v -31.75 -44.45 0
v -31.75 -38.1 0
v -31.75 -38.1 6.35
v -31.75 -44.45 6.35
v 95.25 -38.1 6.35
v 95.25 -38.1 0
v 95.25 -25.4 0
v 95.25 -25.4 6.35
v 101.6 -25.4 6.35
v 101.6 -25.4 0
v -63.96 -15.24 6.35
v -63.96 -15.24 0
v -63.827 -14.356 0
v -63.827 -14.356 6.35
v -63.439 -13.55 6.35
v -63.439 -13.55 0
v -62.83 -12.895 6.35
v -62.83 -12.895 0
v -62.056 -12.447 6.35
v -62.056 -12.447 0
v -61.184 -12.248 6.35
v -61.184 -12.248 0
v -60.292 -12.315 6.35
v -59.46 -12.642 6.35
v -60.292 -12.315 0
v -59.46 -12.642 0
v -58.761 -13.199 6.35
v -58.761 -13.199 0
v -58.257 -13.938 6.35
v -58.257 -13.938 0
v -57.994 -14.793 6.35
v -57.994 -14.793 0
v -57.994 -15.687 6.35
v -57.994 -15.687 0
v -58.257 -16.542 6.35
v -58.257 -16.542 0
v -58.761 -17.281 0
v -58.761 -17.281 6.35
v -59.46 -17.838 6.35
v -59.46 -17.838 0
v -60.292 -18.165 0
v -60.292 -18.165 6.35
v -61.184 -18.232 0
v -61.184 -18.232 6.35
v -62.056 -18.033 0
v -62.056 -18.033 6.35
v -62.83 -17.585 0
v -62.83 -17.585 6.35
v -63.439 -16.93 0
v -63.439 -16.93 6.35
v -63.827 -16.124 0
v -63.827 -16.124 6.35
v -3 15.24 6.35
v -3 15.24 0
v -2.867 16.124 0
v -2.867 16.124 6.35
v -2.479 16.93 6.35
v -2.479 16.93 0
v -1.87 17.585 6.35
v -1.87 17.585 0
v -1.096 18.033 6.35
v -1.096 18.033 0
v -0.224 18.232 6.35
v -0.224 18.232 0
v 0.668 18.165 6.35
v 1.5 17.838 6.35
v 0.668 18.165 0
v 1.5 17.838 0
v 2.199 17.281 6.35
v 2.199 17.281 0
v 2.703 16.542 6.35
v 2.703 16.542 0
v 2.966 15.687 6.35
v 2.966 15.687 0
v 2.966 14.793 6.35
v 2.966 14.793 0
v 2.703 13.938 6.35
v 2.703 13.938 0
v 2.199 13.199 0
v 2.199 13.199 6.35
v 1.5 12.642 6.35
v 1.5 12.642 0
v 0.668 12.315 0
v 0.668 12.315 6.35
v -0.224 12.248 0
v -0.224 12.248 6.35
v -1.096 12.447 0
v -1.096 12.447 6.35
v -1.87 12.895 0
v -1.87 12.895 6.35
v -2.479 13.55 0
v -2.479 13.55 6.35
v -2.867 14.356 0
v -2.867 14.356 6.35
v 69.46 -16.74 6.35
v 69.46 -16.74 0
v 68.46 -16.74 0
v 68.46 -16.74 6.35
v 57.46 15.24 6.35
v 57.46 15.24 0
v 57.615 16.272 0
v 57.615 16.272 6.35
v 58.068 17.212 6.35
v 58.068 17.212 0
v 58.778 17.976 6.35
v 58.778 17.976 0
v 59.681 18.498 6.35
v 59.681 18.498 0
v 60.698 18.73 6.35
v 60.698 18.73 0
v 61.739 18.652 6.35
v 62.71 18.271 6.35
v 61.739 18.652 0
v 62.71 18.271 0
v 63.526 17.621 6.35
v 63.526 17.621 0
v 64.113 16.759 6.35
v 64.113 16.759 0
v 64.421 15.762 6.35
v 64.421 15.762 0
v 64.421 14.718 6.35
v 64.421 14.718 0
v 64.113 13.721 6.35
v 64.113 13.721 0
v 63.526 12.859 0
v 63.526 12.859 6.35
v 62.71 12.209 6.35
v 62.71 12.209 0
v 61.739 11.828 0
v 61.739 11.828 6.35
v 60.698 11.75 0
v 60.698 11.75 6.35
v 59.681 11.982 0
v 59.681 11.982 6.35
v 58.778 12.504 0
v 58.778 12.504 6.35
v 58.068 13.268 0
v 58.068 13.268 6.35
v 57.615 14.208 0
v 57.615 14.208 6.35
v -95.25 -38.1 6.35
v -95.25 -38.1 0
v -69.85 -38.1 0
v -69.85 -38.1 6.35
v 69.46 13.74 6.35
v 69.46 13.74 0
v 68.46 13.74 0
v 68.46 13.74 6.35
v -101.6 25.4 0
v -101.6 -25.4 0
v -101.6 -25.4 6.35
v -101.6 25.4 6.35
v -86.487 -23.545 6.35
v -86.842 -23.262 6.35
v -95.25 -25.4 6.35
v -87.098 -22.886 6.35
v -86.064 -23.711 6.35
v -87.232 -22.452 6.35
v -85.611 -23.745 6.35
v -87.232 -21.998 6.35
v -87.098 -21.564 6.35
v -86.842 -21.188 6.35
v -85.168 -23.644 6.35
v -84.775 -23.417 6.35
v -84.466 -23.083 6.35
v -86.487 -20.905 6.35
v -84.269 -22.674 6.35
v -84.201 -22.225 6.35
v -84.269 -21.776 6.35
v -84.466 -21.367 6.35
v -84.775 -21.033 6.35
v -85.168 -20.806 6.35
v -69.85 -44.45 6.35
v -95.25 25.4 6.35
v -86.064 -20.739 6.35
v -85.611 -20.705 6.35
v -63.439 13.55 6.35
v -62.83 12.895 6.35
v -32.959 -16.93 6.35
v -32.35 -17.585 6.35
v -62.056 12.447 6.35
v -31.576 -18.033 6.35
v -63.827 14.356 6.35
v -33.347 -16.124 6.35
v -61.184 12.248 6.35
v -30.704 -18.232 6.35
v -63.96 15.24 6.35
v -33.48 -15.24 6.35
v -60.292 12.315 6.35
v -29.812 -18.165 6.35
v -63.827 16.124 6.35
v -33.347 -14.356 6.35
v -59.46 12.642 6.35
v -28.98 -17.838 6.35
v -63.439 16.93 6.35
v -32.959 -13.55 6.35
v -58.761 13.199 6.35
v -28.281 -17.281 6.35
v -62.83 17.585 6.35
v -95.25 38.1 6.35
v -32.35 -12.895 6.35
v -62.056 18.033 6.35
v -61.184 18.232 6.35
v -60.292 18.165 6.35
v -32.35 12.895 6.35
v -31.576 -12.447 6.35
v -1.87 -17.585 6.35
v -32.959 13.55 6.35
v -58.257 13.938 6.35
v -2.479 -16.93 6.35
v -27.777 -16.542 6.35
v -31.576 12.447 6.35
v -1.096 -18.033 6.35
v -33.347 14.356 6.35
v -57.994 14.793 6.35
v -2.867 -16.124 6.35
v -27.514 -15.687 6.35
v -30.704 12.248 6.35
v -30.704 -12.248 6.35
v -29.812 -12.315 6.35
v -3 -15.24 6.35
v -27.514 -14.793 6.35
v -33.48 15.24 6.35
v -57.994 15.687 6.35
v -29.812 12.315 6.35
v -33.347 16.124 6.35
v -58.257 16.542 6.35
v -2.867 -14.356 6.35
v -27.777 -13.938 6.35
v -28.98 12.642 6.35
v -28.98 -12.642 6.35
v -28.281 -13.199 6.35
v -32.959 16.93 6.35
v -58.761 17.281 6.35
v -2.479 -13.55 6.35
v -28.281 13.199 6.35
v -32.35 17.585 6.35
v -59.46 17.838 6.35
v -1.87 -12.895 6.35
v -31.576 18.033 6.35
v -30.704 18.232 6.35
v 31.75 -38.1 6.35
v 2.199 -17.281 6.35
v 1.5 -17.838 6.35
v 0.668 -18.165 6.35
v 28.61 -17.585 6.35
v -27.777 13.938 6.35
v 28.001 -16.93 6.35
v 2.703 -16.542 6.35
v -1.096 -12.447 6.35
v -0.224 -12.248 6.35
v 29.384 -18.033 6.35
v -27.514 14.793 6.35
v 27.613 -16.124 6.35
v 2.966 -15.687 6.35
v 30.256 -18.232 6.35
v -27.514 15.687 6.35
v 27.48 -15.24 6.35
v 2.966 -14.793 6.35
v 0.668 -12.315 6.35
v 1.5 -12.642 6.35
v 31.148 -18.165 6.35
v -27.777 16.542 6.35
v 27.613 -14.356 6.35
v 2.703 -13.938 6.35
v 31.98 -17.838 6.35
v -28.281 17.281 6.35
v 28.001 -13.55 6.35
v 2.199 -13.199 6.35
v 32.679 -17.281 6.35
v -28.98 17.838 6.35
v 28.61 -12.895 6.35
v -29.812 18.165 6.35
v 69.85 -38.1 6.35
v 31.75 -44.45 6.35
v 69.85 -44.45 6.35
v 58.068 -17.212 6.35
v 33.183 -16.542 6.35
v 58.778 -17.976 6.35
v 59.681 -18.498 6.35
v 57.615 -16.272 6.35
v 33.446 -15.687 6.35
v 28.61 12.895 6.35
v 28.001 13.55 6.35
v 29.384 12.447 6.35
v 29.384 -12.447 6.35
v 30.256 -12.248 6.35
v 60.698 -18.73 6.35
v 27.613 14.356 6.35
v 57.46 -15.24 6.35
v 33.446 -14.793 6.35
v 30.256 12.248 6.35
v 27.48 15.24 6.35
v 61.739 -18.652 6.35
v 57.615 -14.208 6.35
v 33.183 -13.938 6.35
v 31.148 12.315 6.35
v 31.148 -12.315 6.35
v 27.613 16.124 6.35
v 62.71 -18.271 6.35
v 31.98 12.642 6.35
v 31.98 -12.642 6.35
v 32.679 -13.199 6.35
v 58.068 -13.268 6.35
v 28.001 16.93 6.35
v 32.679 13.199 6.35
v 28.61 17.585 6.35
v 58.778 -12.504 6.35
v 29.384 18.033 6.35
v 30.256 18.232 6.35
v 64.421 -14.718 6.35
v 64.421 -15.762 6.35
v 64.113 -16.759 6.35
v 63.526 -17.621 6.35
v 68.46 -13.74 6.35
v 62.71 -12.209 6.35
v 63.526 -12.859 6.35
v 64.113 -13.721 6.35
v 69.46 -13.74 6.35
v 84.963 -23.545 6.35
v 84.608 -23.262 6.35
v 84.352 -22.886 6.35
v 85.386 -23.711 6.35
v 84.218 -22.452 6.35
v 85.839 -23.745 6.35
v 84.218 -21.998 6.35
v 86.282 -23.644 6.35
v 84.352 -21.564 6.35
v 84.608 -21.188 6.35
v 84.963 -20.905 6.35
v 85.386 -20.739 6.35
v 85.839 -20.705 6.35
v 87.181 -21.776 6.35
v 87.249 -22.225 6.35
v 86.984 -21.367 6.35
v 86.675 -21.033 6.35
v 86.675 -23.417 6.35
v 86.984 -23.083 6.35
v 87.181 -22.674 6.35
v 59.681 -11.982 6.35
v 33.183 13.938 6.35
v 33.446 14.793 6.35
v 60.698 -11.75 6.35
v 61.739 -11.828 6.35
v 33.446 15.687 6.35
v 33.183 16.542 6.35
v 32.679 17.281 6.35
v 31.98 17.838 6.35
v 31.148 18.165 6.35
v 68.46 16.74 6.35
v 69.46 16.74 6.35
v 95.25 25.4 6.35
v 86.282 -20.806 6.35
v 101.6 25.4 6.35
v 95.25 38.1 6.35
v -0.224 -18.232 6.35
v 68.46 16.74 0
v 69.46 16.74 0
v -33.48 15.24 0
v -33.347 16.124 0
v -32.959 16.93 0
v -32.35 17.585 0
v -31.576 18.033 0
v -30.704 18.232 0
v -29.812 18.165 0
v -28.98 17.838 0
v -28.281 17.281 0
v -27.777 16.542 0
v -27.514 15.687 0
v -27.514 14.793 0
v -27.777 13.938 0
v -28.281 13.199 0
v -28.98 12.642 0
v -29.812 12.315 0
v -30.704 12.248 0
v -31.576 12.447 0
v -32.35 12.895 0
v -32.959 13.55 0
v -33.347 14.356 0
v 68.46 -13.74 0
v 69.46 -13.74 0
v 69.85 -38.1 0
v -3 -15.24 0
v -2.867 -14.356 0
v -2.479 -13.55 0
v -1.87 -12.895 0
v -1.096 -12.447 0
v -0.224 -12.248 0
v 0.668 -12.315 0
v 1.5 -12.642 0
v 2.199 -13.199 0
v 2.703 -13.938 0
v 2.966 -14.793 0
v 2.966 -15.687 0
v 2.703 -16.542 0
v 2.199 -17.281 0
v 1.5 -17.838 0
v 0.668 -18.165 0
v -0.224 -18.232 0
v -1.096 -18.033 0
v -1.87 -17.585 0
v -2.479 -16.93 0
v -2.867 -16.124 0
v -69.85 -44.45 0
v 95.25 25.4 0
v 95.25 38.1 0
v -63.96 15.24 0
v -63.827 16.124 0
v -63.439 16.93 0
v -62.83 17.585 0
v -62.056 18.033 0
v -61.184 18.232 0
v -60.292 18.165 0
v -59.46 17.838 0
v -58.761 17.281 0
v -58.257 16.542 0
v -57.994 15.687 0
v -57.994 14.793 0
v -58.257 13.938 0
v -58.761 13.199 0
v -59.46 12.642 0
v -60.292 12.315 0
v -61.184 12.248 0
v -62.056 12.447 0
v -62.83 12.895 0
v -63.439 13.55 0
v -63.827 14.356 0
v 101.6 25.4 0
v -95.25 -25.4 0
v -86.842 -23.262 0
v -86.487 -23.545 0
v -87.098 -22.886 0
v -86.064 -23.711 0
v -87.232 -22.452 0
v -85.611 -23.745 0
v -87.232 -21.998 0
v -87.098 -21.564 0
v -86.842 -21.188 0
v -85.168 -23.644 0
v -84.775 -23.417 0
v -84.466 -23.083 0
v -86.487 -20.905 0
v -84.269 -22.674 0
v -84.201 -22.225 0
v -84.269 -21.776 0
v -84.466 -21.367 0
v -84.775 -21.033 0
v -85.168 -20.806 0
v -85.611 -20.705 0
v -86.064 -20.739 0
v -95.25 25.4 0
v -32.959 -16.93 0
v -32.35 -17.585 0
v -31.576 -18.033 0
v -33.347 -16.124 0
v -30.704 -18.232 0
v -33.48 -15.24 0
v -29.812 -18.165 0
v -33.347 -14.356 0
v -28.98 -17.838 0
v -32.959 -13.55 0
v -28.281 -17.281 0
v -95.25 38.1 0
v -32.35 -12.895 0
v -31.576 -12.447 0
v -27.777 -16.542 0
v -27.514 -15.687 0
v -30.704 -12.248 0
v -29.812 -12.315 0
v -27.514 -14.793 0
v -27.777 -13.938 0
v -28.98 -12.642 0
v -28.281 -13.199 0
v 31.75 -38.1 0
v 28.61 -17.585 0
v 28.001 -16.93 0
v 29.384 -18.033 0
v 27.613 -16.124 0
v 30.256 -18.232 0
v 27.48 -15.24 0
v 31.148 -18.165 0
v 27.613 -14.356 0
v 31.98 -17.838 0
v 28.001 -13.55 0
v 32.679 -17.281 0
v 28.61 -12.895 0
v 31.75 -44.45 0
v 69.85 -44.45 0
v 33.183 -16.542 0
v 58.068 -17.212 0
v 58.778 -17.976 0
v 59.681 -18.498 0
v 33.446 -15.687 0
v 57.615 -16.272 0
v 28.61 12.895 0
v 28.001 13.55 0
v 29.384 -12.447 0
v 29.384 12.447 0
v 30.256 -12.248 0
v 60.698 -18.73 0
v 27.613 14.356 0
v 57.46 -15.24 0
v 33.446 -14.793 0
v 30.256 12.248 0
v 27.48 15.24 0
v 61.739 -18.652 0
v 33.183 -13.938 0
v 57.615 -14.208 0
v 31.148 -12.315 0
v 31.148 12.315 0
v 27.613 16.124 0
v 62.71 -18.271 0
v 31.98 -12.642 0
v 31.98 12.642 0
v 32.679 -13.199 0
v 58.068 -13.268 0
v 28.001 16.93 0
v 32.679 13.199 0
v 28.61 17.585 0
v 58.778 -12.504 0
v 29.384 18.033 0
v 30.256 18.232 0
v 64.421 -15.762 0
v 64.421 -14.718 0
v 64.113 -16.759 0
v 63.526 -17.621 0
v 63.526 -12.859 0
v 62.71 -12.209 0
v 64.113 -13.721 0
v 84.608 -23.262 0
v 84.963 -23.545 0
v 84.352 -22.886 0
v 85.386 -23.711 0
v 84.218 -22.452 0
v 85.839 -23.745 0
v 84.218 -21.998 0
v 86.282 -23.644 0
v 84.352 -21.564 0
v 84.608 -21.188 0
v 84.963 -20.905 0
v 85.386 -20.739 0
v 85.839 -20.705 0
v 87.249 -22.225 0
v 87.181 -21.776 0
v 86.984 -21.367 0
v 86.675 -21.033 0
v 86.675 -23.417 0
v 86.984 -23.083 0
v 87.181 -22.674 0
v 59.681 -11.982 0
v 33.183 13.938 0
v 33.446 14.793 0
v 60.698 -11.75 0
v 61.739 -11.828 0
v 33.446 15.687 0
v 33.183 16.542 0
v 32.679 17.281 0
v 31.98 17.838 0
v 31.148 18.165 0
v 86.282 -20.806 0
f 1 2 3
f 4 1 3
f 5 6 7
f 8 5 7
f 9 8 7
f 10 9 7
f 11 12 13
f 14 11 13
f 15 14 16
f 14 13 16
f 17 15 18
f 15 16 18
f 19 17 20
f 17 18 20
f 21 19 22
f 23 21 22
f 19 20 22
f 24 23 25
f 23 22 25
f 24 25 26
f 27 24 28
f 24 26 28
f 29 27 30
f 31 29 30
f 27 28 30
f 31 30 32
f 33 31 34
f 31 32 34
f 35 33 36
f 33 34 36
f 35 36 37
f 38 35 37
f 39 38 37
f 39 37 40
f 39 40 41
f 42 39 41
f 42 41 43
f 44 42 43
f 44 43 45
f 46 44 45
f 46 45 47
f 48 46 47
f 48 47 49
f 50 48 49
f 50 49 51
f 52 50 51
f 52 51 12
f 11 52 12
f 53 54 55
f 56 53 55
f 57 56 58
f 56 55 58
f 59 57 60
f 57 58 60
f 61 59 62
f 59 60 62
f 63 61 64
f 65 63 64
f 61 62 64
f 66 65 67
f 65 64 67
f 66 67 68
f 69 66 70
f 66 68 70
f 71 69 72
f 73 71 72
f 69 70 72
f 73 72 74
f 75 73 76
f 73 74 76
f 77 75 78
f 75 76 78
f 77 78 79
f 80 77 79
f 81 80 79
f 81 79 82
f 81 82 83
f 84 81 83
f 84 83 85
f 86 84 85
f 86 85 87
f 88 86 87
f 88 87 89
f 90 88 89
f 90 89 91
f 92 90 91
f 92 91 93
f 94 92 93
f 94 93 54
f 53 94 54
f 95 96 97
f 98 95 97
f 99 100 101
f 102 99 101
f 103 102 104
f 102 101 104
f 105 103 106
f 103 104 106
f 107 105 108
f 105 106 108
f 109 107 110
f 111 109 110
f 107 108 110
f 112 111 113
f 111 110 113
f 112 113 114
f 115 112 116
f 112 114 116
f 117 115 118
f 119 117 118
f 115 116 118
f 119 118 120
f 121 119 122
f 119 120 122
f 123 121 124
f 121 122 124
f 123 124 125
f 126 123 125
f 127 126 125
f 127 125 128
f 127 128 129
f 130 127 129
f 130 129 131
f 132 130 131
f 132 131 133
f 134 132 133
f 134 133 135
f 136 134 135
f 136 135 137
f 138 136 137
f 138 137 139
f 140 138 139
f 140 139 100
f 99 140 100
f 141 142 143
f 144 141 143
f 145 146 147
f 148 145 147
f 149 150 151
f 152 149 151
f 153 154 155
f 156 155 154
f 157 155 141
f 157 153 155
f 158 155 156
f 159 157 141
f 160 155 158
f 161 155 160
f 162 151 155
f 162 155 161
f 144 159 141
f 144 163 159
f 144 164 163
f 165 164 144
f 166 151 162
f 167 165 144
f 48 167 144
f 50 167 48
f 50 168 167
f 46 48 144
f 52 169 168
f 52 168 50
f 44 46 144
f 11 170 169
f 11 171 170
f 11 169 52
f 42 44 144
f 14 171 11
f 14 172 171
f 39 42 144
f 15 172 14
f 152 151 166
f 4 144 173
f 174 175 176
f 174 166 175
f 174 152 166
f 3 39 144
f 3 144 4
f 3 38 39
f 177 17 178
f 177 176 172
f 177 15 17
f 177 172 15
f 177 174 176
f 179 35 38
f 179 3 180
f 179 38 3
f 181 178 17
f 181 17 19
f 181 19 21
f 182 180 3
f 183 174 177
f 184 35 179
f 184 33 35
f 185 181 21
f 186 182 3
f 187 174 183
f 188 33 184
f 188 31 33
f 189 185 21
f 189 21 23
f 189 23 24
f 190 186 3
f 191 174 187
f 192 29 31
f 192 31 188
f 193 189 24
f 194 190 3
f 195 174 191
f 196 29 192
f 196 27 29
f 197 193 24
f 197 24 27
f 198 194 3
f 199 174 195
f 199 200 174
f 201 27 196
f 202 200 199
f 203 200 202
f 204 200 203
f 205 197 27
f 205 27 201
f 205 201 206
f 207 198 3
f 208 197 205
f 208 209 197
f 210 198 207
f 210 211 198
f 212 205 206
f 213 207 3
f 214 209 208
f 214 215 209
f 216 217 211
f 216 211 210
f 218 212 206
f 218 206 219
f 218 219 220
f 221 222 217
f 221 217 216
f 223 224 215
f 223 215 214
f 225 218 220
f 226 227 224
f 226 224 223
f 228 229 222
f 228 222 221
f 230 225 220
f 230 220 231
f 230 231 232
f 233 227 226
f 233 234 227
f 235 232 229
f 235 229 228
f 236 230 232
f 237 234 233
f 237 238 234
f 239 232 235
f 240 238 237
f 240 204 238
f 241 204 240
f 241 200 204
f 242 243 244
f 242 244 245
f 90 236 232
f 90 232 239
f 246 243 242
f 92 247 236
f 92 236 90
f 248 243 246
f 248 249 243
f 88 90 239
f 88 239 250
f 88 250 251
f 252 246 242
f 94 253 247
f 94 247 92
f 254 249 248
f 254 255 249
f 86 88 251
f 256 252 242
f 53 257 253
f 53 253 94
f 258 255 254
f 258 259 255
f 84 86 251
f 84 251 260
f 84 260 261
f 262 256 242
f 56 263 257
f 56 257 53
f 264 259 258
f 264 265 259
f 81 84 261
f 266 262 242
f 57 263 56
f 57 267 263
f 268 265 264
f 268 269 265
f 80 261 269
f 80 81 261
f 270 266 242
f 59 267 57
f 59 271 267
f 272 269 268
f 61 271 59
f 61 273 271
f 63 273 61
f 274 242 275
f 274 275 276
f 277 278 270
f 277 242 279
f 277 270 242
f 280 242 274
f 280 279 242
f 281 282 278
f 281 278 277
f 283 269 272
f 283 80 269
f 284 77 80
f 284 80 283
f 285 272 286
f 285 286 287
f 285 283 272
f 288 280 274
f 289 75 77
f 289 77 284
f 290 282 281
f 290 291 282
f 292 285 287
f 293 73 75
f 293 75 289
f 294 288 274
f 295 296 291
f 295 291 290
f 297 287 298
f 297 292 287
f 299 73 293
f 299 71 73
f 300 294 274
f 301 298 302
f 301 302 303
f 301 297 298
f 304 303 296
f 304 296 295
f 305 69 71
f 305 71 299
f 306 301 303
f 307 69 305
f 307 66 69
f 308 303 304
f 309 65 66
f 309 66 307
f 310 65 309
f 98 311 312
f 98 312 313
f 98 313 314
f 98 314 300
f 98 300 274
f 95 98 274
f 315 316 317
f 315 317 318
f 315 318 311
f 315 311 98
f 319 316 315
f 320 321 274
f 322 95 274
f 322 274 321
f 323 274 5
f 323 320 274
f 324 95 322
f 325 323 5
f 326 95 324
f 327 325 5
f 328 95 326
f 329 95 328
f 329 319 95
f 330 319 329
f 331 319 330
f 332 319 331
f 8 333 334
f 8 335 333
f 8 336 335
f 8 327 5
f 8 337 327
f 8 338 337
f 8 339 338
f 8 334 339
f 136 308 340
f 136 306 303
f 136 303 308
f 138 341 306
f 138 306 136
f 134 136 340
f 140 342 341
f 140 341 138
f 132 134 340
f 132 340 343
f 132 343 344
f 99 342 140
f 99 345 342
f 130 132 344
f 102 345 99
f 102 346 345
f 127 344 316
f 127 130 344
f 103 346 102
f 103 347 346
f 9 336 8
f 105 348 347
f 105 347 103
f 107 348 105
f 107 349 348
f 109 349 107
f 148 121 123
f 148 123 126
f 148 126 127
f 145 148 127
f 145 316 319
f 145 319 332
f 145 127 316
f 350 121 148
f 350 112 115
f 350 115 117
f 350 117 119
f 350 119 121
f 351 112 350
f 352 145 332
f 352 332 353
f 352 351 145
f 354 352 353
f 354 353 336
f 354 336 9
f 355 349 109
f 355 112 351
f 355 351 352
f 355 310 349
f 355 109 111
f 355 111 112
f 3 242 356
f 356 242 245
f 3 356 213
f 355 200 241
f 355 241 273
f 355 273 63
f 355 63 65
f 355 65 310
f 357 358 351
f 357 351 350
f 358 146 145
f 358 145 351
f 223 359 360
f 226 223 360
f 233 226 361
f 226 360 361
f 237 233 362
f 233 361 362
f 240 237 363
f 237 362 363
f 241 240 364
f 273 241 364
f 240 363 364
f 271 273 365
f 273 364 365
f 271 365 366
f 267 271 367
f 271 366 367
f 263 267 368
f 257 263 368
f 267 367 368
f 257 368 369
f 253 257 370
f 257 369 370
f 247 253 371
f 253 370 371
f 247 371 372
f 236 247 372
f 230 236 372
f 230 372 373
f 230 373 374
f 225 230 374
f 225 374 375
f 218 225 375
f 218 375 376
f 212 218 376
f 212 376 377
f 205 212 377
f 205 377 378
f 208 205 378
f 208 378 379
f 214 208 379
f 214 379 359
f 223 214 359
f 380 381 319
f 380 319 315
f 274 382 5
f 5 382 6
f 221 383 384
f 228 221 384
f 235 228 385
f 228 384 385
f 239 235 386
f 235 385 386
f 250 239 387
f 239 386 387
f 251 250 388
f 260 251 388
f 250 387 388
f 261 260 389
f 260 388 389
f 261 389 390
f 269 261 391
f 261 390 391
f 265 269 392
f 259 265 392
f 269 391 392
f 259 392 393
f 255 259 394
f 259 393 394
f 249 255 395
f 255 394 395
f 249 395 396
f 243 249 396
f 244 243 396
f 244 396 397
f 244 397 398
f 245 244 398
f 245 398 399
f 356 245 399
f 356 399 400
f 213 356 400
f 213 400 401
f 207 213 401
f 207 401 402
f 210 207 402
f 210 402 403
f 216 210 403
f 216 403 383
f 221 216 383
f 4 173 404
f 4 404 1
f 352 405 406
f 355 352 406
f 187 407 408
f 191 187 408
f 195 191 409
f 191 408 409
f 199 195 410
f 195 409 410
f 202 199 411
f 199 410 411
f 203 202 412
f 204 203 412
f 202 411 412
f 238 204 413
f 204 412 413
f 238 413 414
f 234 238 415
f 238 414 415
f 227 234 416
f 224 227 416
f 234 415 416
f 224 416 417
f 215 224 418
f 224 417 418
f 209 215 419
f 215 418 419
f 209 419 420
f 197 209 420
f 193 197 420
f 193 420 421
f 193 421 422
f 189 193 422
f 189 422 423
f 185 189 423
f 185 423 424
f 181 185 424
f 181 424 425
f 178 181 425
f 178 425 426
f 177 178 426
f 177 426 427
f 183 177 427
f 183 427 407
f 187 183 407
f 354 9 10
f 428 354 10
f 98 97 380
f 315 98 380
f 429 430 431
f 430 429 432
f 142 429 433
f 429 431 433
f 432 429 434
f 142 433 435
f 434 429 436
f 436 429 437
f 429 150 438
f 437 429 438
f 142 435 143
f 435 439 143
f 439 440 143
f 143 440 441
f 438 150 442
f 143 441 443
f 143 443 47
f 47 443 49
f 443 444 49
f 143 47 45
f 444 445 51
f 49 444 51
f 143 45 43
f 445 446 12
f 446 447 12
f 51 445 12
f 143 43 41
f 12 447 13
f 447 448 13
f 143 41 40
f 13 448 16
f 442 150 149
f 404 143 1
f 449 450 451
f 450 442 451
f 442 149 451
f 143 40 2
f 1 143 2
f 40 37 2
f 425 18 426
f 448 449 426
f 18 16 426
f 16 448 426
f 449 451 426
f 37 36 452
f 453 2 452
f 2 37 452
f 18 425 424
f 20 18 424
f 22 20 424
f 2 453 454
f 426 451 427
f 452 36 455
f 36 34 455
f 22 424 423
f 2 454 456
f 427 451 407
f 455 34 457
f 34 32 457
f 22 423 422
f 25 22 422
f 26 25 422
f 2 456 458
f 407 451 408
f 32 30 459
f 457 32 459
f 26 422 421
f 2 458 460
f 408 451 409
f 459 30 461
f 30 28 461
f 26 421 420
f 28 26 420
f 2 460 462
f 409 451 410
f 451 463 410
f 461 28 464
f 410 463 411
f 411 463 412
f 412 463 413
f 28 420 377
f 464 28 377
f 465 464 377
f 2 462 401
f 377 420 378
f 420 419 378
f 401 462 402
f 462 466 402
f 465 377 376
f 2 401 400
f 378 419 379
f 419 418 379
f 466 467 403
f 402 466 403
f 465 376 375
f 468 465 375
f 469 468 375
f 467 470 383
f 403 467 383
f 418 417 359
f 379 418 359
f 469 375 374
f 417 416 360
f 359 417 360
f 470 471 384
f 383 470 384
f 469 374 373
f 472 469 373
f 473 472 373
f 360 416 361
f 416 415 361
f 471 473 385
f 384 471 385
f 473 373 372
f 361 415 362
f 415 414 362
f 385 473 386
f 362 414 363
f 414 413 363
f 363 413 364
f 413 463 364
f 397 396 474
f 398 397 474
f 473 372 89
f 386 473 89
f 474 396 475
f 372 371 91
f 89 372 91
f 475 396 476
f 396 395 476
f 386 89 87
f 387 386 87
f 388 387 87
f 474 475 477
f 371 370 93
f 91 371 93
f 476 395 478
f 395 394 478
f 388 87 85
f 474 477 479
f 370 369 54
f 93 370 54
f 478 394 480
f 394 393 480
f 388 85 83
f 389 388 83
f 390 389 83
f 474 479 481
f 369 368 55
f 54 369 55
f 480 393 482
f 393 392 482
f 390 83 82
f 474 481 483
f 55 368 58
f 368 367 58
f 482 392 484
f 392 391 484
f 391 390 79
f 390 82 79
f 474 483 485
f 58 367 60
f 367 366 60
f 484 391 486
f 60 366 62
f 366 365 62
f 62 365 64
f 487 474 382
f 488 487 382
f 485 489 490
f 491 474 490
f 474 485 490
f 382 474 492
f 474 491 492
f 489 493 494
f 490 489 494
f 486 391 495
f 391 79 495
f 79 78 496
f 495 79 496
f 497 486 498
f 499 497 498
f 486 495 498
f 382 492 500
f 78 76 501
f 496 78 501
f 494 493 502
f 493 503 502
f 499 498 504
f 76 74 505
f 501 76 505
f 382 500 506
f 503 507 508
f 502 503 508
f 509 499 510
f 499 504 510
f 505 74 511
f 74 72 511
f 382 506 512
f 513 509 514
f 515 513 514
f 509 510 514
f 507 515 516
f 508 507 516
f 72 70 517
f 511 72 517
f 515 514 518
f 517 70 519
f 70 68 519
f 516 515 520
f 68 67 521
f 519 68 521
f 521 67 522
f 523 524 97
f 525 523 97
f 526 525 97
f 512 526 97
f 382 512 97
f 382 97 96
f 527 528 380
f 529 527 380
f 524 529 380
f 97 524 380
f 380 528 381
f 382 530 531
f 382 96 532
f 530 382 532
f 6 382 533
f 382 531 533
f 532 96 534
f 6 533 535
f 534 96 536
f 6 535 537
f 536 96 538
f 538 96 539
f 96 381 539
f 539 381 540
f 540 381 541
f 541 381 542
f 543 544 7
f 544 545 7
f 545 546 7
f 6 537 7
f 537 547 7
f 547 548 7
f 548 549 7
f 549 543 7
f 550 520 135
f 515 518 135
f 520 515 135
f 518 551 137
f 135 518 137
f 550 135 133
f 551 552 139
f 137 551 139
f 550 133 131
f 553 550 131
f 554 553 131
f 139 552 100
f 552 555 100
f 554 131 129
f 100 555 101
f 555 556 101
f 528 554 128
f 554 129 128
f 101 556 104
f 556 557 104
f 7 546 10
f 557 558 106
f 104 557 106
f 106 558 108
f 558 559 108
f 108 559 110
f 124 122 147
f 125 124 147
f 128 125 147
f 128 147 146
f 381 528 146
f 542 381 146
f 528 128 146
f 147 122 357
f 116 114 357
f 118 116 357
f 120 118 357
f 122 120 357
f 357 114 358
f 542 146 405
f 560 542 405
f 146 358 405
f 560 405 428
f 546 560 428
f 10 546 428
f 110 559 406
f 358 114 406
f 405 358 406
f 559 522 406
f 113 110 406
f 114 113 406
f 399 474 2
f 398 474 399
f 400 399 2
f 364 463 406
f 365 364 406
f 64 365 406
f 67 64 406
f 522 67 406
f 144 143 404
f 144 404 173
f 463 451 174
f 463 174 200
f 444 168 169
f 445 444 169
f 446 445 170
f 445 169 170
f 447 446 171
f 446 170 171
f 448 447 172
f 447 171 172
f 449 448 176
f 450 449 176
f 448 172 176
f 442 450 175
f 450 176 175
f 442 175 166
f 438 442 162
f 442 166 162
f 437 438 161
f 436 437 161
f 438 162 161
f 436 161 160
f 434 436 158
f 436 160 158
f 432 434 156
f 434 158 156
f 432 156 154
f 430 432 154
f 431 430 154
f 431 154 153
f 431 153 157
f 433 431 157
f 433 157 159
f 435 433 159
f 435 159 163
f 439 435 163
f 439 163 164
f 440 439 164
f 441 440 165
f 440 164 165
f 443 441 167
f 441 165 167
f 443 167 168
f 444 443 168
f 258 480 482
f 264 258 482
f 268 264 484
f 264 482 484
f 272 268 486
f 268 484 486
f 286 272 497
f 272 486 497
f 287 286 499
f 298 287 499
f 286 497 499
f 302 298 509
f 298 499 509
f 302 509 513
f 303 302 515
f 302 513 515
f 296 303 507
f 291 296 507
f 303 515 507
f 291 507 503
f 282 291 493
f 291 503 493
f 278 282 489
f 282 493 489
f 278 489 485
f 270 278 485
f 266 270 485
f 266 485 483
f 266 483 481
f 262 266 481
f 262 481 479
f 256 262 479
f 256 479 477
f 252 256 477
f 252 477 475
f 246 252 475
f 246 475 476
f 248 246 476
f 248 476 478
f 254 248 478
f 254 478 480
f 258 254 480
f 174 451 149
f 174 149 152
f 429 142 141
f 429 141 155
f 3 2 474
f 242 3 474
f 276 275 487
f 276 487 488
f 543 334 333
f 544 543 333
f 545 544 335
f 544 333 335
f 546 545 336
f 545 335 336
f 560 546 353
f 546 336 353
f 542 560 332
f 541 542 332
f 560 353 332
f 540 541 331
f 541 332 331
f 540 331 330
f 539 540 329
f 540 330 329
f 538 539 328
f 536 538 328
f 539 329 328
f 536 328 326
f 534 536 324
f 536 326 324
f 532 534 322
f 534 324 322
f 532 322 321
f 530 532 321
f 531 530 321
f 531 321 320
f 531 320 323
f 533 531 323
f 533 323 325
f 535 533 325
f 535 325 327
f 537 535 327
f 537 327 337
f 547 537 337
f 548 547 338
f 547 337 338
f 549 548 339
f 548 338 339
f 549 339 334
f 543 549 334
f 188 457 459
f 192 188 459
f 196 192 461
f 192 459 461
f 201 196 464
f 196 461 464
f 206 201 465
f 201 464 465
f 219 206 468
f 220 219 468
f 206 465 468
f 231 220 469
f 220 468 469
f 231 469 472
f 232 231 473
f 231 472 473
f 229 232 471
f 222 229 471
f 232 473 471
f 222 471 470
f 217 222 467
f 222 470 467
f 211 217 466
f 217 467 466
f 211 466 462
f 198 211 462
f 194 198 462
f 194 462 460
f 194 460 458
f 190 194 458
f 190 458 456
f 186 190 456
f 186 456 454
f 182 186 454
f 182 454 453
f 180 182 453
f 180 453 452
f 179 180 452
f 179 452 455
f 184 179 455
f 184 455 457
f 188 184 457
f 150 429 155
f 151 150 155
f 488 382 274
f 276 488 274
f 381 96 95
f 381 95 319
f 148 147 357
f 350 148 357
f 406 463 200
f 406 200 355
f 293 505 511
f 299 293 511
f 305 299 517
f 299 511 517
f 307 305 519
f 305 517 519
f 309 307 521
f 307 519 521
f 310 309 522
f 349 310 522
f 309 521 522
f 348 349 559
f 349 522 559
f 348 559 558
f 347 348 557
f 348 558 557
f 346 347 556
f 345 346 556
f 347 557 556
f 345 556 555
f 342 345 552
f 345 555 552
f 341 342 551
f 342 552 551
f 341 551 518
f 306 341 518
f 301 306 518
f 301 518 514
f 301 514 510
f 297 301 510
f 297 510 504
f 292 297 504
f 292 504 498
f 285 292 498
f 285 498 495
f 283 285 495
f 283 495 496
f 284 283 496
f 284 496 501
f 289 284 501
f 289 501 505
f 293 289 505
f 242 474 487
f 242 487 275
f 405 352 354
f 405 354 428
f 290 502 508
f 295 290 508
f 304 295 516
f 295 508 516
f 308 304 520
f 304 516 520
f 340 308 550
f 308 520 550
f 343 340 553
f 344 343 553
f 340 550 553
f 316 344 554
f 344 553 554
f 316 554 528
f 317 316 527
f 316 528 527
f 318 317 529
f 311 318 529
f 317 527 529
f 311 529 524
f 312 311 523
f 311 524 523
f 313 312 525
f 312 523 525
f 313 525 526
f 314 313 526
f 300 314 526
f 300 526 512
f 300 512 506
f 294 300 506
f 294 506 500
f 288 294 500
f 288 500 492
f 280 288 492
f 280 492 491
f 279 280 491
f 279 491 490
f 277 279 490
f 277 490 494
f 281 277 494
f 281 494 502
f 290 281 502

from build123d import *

# Parameters (mm, degrees)
SKETCH1_W           = 190.5
SKETCH1_H           = 76.2
BOSS_EXTRUDE1_DEPTH = 6.35
SKETCH2_W           = 6.35
SKETCH2_H           = 50.8
BOSS_EXTRUDE2_DEPTH = 6.35
SKETCH3_W           = 6.35
SKETCH3_H           = 50.8
BOSS_EXTRUDE3_DEPTH = 6.35
SKETCH4_W           = 38.1
SKETCH4_H           = 6.35
BOSS_EXTRUDE4_DEPTH = 6.35
CUT_EXTRUDE1_REACH  = 8.35
SKETCH7_R           = 3
SKETCH7_R_2         = 3.5
SKETCH7_W           = 1
SKETCH7_H           = 3
SKETCH8_R           = 1.524
CUT_EXTRUDE2_DEPTH  = 6.35


with BuildPart() as part:
    # Sketch1 → Boss-Extrude1 (new body)
    with BuildSketch(Plane.XY):
        Rectangle(SKETCH1_W, SKETCH1_H)
    extrude(amount=BOSS_EXTRUDE1_DEPTH)

    # Sketch2 → Boss-Extrude2 (add)
    with BuildSketch(Plane.ZY.offset(95.25)):
        with Locations((3.175, 0)):
            Rectangle(SKETCH2_W, SKETCH2_H)
    extrude(amount=BOSS_EXTRUDE2_DEPTH)

    # Sketch3 → Boss-Extrude3 (add)
    with BuildSketch(Plane(origin=(95.25, 0, 0), x_dir=(0, 0, -1), z_dir=(1, 0, 0))):
        with Locations((-3.175, 0)):
            Rectangle(SKETCH3_W, SKETCH3_H)
    extrude(amount=BOSS_EXTRUDE3_DEPTH)

    # Sketch4 → Boss-Extrude4 (add)
    with BuildSketch(Plane.XZ.offset(38.1)):
        with Locations((-50.8, 3.175)):
            Rectangle(SKETCH4_W, SKETCH4_H)
        with Locations((50.8, 3.175)):
            Rectangle(SKETCH4_W, SKETCH4_H)
    extrude(amount=BOSS_EXTRUDE4_DEPTH)

    # Sketch7 → Cut-Extrude1 (cut, up to next)
    with BuildSketch(Plane(origin=(0, 0, 0), x_dir=(-1, 0, 0), z_dir=(0, 0, -1)), mode=Mode.PRIVATE) as cut_extrude1_sk1:
        with Locations((-30.48, 15.24)):
            Circle(SKETCH7_R)
    cut_extrude1_tool1 = extrude(cut_extrude1_sk1.sketch, amount=-CUT_EXTRUDE1_REACH, mode=Mode.PRIVATE) & part.part
    add(cut_extrude1_tool1.solids().sort_by_distance((30.48, 15.24, 0))[0], mode=Mode.SUBTRACT)
    # Sketch7 → Cut-Extrude1 (cut, up to next)
    with BuildSketch(Plane(origin=(0, 0, 0), x_dir=(-1, 0, 0), z_dir=(0, 0, -1)), mode=Mode.PRIVATE) as cut_extrude1_sk2:
        with Locations((0, 15.24)):
            Circle(SKETCH7_R)
    cut_extrude1_tool2 = extrude(cut_extrude1_sk2.sketch, amount=-CUT_EXTRUDE1_REACH, mode=Mode.PRIVATE) & part.part
    add(cut_extrude1_tool2.solids().sort_by_distance((0, 15.24, 0))[0], mode=Mode.SUBTRACT)
    # Sketch7 → Cut-Extrude1 (cut, up to next)
    with BuildSketch(Plane(origin=(0, 0, 0), x_dir=(-1, 0, 0), z_dir=(0, 0, -1)), mode=Mode.PRIVATE) as cut_extrude1_sk3:
        with Locations((30.48, 15.24)):
            Circle(SKETCH7_R)
    cut_extrude1_tool3 = extrude(cut_extrude1_sk3.sketch, amount=-CUT_EXTRUDE1_REACH, mode=Mode.PRIVATE) & part.part
    add(cut_extrude1_tool3.solids().sort_by_distance((-30.48, 15.24, 0))[0], mode=Mode.SUBTRACT)
    # Sketch7 → Cut-Extrude1 (cut, up to next)
    with BuildSketch(Plane(origin=(0, 0, 0), x_dir=(-1, 0, 0), z_dir=(0, 0, -1)), mode=Mode.PRIVATE) as cut_extrude1_sk4:
        with Locations((60.96, 15.24)):
            Circle(SKETCH7_R)
    cut_extrude1_tool4 = extrude(cut_extrude1_sk4.sketch, amount=-CUT_EXTRUDE1_REACH, mode=Mode.PRIVATE) & part.part
    add(cut_extrude1_tool4.solids().sort_by_distance((-60.96, 15.24, 0))[0], mode=Mode.SUBTRACT)
    # Sketch7 → Cut-Extrude1 (cut, up to next)
    with BuildSketch(Plane(origin=(0, 0, 0), x_dir=(-1, 0, 0), z_dir=(0, 0, -1)), mode=Mode.PRIVATE) as cut_extrude1_sk5:
        with Locations((0, -15.24)):
            Circle(SKETCH7_R)
    cut_extrude1_tool5 = extrude(cut_extrude1_sk5.sketch, amount=-CUT_EXTRUDE1_REACH, mode=Mode.PRIVATE) & part.part
    add(cut_extrude1_tool5.solids().sort_by_distance((0, -15.24, 0))[0], mode=Mode.SUBTRACT)
    # Sketch7 → Cut-Extrude1 (cut, up to next)
    with BuildSketch(Plane(origin=(0, 0, 0), x_dir=(-1, 0, 0), z_dir=(0, 0, -1)), mode=Mode.PRIVATE) as cut_extrude1_sk6:
        with Locations((30.48, -15.24)):
            Circle(SKETCH7_R)
    cut_extrude1_tool6 = extrude(cut_extrude1_sk6.sketch, amount=-CUT_EXTRUDE1_REACH, mode=Mode.PRIVATE) & part.part
    add(cut_extrude1_tool6.solids().sort_by_distance((-30.48, -15.24, 0))[0], mode=Mode.SUBTRACT)
    # Sketch7 → Cut-Extrude1 (cut, up to next)
    with BuildSketch(Plane(origin=(0, 0, 0), x_dir=(-1, 0, 0), z_dir=(0, 0, -1)), mode=Mode.PRIVATE) as cut_extrude1_sk7:
        with Locations((60.96, -15.24)):
            Circle(SKETCH7_R)
    cut_extrude1_tool7 = extrude(cut_extrude1_sk7.sketch, amount=-CUT_EXTRUDE1_REACH, mode=Mode.PRIVATE) & part.part
    add(cut_extrude1_tool7.solids().sort_by_distance((-60.96, -15.24, 0))[0], mode=Mode.SUBTRACT)
    # Sketch7 → Cut-Extrude1 (cut, up to next)
    with BuildSketch(Plane(origin=(0, 0, 0), x_dir=(-1, 0, 0), z_dir=(0, 0, -1)), mode=Mode.PRIVATE) as cut_extrude1_sk8:
        with Locations((-30.48, -15.24)):
            Circle(SKETCH7_R)
    cut_extrude1_tool8 = extrude(cut_extrude1_sk8.sketch, amount=-CUT_EXTRUDE1_REACH, mode=Mode.PRIVATE) & part.part
    add(cut_extrude1_tool8.solids().sort_by_distance((30.48, -15.24, 0))[0], mode=Mode.SUBTRACT)
    # Sketch7 → Cut-Extrude1 (cut, up to next)
    with BuildSketch(Plane(origin=(0, 0, 0), x_dir=(-1, 0, 0), z_dir=(0, 0, -1)), mode=Mode.PRIVATE) as cut_extrude1_sk9:
        with Locations((-60.96, 15.24)):
            Circle(SKETCH7_R_2)
    cut_extrude1_tool9 = extrude(cut_extrude1_sk9.sketch, amount=-CUT_EXTRUDE1_REACH, mode=Mode.PRIVATE) & part.part
    add(cut_extrude1_tool9.solids().sort_by_distance((60.96, 15.24, 0))[0], mode=Mode.SUBTRACT)
    # Sketch7 → Cut-Extrude1 (cut, up to next)
    with BuildSketch(Plane(origin=(0, 0, 0), x_dir=(-1, 0, 0), z_dir=(0, 0, -1)), mode=Mode.PRIVATE) as cut_extrude1_sk10:
        with Locations((-60.96, -15.24)):
            Circle(SKETCH7_R_2)
    cut_extrude1_tool10 = extrude(cut_extrude1_sk10.sketch, amount=-CUT_EXTRUDE1_REACH, mode=Mode.PRIVATE) & part.part
    add(cut_extrude1_tool10.solids().sort_by_distance((60.96, -15.24, 0))[0], mode=Mode.SUBTRACT)
    # Sketch7 → Cut-Extrude1 (cut, up to next)
    with BuildSketch(Plane(origin=(0, 0, 0), x_dir=(-1, 0, 0), z_dir=(0, 0, -1)), mode=Mode.PRIVATE) as cut_extrude1_sk11:
        with Locations((-68.96, 15.24)):
            Rectangle(SKETCH7_W, SKETCH7_H)
    cut_extrude1_tool11 = extrude(cut_extrude1_sk11.sketch, amount=-CUT_EXTRUDE1_REACH, mode=Mode.PRIVATE) & part.part
    add(cut_extrude1_tool11.solids().sort_by_distance((68.96, 15.24, 0))[0], mode=Mode.SUBTRACT)
    # Sketch7 → Cut-Extrude1 (cut, up to next)
    with BuildSketch(Plane(origin=(0, 0, 0), x_dir=(-1, 0, 0), z_dir=(0, 0, -1)), mode=Mode.PRIVATE) as cut_extrude1_sk12:
        with Locations((-68.96, -15.24)):
            Rectangle(SKETCH7_W, SKETCH7_H)
    cut_extrude1_tool12 = extrude(cut_extrude1_sk12.sketch, amount=-CUT_EXTRUDE1_REACH, mode=Mode.PRIVATE) & part.part
    add(cut_extrude1_tool12.solids().sort_by_distance((68.96, -15.24, 0))[0], mode=Mode.SUBTRACT)

    # Sketch8 → Cut-Extrude2 (cut)
    with BuildSketch(Plane(origin=(23.763692911, 98.5857123, 6.35), x_dir=(1, 0, 0), z_dir=(0, 0, 1))):
        with Locations((-109.488692911, -120.8107123)):
            Circle(SKETCH8_R)
        with Locations((61.961307089, -120.8107123)):
            Circle(SKETCH8_R)
    extrude(amount=-CUT_EXTRUDE2_DEPTH, mode=Mode.SUBTRACT)


solid = part.part
